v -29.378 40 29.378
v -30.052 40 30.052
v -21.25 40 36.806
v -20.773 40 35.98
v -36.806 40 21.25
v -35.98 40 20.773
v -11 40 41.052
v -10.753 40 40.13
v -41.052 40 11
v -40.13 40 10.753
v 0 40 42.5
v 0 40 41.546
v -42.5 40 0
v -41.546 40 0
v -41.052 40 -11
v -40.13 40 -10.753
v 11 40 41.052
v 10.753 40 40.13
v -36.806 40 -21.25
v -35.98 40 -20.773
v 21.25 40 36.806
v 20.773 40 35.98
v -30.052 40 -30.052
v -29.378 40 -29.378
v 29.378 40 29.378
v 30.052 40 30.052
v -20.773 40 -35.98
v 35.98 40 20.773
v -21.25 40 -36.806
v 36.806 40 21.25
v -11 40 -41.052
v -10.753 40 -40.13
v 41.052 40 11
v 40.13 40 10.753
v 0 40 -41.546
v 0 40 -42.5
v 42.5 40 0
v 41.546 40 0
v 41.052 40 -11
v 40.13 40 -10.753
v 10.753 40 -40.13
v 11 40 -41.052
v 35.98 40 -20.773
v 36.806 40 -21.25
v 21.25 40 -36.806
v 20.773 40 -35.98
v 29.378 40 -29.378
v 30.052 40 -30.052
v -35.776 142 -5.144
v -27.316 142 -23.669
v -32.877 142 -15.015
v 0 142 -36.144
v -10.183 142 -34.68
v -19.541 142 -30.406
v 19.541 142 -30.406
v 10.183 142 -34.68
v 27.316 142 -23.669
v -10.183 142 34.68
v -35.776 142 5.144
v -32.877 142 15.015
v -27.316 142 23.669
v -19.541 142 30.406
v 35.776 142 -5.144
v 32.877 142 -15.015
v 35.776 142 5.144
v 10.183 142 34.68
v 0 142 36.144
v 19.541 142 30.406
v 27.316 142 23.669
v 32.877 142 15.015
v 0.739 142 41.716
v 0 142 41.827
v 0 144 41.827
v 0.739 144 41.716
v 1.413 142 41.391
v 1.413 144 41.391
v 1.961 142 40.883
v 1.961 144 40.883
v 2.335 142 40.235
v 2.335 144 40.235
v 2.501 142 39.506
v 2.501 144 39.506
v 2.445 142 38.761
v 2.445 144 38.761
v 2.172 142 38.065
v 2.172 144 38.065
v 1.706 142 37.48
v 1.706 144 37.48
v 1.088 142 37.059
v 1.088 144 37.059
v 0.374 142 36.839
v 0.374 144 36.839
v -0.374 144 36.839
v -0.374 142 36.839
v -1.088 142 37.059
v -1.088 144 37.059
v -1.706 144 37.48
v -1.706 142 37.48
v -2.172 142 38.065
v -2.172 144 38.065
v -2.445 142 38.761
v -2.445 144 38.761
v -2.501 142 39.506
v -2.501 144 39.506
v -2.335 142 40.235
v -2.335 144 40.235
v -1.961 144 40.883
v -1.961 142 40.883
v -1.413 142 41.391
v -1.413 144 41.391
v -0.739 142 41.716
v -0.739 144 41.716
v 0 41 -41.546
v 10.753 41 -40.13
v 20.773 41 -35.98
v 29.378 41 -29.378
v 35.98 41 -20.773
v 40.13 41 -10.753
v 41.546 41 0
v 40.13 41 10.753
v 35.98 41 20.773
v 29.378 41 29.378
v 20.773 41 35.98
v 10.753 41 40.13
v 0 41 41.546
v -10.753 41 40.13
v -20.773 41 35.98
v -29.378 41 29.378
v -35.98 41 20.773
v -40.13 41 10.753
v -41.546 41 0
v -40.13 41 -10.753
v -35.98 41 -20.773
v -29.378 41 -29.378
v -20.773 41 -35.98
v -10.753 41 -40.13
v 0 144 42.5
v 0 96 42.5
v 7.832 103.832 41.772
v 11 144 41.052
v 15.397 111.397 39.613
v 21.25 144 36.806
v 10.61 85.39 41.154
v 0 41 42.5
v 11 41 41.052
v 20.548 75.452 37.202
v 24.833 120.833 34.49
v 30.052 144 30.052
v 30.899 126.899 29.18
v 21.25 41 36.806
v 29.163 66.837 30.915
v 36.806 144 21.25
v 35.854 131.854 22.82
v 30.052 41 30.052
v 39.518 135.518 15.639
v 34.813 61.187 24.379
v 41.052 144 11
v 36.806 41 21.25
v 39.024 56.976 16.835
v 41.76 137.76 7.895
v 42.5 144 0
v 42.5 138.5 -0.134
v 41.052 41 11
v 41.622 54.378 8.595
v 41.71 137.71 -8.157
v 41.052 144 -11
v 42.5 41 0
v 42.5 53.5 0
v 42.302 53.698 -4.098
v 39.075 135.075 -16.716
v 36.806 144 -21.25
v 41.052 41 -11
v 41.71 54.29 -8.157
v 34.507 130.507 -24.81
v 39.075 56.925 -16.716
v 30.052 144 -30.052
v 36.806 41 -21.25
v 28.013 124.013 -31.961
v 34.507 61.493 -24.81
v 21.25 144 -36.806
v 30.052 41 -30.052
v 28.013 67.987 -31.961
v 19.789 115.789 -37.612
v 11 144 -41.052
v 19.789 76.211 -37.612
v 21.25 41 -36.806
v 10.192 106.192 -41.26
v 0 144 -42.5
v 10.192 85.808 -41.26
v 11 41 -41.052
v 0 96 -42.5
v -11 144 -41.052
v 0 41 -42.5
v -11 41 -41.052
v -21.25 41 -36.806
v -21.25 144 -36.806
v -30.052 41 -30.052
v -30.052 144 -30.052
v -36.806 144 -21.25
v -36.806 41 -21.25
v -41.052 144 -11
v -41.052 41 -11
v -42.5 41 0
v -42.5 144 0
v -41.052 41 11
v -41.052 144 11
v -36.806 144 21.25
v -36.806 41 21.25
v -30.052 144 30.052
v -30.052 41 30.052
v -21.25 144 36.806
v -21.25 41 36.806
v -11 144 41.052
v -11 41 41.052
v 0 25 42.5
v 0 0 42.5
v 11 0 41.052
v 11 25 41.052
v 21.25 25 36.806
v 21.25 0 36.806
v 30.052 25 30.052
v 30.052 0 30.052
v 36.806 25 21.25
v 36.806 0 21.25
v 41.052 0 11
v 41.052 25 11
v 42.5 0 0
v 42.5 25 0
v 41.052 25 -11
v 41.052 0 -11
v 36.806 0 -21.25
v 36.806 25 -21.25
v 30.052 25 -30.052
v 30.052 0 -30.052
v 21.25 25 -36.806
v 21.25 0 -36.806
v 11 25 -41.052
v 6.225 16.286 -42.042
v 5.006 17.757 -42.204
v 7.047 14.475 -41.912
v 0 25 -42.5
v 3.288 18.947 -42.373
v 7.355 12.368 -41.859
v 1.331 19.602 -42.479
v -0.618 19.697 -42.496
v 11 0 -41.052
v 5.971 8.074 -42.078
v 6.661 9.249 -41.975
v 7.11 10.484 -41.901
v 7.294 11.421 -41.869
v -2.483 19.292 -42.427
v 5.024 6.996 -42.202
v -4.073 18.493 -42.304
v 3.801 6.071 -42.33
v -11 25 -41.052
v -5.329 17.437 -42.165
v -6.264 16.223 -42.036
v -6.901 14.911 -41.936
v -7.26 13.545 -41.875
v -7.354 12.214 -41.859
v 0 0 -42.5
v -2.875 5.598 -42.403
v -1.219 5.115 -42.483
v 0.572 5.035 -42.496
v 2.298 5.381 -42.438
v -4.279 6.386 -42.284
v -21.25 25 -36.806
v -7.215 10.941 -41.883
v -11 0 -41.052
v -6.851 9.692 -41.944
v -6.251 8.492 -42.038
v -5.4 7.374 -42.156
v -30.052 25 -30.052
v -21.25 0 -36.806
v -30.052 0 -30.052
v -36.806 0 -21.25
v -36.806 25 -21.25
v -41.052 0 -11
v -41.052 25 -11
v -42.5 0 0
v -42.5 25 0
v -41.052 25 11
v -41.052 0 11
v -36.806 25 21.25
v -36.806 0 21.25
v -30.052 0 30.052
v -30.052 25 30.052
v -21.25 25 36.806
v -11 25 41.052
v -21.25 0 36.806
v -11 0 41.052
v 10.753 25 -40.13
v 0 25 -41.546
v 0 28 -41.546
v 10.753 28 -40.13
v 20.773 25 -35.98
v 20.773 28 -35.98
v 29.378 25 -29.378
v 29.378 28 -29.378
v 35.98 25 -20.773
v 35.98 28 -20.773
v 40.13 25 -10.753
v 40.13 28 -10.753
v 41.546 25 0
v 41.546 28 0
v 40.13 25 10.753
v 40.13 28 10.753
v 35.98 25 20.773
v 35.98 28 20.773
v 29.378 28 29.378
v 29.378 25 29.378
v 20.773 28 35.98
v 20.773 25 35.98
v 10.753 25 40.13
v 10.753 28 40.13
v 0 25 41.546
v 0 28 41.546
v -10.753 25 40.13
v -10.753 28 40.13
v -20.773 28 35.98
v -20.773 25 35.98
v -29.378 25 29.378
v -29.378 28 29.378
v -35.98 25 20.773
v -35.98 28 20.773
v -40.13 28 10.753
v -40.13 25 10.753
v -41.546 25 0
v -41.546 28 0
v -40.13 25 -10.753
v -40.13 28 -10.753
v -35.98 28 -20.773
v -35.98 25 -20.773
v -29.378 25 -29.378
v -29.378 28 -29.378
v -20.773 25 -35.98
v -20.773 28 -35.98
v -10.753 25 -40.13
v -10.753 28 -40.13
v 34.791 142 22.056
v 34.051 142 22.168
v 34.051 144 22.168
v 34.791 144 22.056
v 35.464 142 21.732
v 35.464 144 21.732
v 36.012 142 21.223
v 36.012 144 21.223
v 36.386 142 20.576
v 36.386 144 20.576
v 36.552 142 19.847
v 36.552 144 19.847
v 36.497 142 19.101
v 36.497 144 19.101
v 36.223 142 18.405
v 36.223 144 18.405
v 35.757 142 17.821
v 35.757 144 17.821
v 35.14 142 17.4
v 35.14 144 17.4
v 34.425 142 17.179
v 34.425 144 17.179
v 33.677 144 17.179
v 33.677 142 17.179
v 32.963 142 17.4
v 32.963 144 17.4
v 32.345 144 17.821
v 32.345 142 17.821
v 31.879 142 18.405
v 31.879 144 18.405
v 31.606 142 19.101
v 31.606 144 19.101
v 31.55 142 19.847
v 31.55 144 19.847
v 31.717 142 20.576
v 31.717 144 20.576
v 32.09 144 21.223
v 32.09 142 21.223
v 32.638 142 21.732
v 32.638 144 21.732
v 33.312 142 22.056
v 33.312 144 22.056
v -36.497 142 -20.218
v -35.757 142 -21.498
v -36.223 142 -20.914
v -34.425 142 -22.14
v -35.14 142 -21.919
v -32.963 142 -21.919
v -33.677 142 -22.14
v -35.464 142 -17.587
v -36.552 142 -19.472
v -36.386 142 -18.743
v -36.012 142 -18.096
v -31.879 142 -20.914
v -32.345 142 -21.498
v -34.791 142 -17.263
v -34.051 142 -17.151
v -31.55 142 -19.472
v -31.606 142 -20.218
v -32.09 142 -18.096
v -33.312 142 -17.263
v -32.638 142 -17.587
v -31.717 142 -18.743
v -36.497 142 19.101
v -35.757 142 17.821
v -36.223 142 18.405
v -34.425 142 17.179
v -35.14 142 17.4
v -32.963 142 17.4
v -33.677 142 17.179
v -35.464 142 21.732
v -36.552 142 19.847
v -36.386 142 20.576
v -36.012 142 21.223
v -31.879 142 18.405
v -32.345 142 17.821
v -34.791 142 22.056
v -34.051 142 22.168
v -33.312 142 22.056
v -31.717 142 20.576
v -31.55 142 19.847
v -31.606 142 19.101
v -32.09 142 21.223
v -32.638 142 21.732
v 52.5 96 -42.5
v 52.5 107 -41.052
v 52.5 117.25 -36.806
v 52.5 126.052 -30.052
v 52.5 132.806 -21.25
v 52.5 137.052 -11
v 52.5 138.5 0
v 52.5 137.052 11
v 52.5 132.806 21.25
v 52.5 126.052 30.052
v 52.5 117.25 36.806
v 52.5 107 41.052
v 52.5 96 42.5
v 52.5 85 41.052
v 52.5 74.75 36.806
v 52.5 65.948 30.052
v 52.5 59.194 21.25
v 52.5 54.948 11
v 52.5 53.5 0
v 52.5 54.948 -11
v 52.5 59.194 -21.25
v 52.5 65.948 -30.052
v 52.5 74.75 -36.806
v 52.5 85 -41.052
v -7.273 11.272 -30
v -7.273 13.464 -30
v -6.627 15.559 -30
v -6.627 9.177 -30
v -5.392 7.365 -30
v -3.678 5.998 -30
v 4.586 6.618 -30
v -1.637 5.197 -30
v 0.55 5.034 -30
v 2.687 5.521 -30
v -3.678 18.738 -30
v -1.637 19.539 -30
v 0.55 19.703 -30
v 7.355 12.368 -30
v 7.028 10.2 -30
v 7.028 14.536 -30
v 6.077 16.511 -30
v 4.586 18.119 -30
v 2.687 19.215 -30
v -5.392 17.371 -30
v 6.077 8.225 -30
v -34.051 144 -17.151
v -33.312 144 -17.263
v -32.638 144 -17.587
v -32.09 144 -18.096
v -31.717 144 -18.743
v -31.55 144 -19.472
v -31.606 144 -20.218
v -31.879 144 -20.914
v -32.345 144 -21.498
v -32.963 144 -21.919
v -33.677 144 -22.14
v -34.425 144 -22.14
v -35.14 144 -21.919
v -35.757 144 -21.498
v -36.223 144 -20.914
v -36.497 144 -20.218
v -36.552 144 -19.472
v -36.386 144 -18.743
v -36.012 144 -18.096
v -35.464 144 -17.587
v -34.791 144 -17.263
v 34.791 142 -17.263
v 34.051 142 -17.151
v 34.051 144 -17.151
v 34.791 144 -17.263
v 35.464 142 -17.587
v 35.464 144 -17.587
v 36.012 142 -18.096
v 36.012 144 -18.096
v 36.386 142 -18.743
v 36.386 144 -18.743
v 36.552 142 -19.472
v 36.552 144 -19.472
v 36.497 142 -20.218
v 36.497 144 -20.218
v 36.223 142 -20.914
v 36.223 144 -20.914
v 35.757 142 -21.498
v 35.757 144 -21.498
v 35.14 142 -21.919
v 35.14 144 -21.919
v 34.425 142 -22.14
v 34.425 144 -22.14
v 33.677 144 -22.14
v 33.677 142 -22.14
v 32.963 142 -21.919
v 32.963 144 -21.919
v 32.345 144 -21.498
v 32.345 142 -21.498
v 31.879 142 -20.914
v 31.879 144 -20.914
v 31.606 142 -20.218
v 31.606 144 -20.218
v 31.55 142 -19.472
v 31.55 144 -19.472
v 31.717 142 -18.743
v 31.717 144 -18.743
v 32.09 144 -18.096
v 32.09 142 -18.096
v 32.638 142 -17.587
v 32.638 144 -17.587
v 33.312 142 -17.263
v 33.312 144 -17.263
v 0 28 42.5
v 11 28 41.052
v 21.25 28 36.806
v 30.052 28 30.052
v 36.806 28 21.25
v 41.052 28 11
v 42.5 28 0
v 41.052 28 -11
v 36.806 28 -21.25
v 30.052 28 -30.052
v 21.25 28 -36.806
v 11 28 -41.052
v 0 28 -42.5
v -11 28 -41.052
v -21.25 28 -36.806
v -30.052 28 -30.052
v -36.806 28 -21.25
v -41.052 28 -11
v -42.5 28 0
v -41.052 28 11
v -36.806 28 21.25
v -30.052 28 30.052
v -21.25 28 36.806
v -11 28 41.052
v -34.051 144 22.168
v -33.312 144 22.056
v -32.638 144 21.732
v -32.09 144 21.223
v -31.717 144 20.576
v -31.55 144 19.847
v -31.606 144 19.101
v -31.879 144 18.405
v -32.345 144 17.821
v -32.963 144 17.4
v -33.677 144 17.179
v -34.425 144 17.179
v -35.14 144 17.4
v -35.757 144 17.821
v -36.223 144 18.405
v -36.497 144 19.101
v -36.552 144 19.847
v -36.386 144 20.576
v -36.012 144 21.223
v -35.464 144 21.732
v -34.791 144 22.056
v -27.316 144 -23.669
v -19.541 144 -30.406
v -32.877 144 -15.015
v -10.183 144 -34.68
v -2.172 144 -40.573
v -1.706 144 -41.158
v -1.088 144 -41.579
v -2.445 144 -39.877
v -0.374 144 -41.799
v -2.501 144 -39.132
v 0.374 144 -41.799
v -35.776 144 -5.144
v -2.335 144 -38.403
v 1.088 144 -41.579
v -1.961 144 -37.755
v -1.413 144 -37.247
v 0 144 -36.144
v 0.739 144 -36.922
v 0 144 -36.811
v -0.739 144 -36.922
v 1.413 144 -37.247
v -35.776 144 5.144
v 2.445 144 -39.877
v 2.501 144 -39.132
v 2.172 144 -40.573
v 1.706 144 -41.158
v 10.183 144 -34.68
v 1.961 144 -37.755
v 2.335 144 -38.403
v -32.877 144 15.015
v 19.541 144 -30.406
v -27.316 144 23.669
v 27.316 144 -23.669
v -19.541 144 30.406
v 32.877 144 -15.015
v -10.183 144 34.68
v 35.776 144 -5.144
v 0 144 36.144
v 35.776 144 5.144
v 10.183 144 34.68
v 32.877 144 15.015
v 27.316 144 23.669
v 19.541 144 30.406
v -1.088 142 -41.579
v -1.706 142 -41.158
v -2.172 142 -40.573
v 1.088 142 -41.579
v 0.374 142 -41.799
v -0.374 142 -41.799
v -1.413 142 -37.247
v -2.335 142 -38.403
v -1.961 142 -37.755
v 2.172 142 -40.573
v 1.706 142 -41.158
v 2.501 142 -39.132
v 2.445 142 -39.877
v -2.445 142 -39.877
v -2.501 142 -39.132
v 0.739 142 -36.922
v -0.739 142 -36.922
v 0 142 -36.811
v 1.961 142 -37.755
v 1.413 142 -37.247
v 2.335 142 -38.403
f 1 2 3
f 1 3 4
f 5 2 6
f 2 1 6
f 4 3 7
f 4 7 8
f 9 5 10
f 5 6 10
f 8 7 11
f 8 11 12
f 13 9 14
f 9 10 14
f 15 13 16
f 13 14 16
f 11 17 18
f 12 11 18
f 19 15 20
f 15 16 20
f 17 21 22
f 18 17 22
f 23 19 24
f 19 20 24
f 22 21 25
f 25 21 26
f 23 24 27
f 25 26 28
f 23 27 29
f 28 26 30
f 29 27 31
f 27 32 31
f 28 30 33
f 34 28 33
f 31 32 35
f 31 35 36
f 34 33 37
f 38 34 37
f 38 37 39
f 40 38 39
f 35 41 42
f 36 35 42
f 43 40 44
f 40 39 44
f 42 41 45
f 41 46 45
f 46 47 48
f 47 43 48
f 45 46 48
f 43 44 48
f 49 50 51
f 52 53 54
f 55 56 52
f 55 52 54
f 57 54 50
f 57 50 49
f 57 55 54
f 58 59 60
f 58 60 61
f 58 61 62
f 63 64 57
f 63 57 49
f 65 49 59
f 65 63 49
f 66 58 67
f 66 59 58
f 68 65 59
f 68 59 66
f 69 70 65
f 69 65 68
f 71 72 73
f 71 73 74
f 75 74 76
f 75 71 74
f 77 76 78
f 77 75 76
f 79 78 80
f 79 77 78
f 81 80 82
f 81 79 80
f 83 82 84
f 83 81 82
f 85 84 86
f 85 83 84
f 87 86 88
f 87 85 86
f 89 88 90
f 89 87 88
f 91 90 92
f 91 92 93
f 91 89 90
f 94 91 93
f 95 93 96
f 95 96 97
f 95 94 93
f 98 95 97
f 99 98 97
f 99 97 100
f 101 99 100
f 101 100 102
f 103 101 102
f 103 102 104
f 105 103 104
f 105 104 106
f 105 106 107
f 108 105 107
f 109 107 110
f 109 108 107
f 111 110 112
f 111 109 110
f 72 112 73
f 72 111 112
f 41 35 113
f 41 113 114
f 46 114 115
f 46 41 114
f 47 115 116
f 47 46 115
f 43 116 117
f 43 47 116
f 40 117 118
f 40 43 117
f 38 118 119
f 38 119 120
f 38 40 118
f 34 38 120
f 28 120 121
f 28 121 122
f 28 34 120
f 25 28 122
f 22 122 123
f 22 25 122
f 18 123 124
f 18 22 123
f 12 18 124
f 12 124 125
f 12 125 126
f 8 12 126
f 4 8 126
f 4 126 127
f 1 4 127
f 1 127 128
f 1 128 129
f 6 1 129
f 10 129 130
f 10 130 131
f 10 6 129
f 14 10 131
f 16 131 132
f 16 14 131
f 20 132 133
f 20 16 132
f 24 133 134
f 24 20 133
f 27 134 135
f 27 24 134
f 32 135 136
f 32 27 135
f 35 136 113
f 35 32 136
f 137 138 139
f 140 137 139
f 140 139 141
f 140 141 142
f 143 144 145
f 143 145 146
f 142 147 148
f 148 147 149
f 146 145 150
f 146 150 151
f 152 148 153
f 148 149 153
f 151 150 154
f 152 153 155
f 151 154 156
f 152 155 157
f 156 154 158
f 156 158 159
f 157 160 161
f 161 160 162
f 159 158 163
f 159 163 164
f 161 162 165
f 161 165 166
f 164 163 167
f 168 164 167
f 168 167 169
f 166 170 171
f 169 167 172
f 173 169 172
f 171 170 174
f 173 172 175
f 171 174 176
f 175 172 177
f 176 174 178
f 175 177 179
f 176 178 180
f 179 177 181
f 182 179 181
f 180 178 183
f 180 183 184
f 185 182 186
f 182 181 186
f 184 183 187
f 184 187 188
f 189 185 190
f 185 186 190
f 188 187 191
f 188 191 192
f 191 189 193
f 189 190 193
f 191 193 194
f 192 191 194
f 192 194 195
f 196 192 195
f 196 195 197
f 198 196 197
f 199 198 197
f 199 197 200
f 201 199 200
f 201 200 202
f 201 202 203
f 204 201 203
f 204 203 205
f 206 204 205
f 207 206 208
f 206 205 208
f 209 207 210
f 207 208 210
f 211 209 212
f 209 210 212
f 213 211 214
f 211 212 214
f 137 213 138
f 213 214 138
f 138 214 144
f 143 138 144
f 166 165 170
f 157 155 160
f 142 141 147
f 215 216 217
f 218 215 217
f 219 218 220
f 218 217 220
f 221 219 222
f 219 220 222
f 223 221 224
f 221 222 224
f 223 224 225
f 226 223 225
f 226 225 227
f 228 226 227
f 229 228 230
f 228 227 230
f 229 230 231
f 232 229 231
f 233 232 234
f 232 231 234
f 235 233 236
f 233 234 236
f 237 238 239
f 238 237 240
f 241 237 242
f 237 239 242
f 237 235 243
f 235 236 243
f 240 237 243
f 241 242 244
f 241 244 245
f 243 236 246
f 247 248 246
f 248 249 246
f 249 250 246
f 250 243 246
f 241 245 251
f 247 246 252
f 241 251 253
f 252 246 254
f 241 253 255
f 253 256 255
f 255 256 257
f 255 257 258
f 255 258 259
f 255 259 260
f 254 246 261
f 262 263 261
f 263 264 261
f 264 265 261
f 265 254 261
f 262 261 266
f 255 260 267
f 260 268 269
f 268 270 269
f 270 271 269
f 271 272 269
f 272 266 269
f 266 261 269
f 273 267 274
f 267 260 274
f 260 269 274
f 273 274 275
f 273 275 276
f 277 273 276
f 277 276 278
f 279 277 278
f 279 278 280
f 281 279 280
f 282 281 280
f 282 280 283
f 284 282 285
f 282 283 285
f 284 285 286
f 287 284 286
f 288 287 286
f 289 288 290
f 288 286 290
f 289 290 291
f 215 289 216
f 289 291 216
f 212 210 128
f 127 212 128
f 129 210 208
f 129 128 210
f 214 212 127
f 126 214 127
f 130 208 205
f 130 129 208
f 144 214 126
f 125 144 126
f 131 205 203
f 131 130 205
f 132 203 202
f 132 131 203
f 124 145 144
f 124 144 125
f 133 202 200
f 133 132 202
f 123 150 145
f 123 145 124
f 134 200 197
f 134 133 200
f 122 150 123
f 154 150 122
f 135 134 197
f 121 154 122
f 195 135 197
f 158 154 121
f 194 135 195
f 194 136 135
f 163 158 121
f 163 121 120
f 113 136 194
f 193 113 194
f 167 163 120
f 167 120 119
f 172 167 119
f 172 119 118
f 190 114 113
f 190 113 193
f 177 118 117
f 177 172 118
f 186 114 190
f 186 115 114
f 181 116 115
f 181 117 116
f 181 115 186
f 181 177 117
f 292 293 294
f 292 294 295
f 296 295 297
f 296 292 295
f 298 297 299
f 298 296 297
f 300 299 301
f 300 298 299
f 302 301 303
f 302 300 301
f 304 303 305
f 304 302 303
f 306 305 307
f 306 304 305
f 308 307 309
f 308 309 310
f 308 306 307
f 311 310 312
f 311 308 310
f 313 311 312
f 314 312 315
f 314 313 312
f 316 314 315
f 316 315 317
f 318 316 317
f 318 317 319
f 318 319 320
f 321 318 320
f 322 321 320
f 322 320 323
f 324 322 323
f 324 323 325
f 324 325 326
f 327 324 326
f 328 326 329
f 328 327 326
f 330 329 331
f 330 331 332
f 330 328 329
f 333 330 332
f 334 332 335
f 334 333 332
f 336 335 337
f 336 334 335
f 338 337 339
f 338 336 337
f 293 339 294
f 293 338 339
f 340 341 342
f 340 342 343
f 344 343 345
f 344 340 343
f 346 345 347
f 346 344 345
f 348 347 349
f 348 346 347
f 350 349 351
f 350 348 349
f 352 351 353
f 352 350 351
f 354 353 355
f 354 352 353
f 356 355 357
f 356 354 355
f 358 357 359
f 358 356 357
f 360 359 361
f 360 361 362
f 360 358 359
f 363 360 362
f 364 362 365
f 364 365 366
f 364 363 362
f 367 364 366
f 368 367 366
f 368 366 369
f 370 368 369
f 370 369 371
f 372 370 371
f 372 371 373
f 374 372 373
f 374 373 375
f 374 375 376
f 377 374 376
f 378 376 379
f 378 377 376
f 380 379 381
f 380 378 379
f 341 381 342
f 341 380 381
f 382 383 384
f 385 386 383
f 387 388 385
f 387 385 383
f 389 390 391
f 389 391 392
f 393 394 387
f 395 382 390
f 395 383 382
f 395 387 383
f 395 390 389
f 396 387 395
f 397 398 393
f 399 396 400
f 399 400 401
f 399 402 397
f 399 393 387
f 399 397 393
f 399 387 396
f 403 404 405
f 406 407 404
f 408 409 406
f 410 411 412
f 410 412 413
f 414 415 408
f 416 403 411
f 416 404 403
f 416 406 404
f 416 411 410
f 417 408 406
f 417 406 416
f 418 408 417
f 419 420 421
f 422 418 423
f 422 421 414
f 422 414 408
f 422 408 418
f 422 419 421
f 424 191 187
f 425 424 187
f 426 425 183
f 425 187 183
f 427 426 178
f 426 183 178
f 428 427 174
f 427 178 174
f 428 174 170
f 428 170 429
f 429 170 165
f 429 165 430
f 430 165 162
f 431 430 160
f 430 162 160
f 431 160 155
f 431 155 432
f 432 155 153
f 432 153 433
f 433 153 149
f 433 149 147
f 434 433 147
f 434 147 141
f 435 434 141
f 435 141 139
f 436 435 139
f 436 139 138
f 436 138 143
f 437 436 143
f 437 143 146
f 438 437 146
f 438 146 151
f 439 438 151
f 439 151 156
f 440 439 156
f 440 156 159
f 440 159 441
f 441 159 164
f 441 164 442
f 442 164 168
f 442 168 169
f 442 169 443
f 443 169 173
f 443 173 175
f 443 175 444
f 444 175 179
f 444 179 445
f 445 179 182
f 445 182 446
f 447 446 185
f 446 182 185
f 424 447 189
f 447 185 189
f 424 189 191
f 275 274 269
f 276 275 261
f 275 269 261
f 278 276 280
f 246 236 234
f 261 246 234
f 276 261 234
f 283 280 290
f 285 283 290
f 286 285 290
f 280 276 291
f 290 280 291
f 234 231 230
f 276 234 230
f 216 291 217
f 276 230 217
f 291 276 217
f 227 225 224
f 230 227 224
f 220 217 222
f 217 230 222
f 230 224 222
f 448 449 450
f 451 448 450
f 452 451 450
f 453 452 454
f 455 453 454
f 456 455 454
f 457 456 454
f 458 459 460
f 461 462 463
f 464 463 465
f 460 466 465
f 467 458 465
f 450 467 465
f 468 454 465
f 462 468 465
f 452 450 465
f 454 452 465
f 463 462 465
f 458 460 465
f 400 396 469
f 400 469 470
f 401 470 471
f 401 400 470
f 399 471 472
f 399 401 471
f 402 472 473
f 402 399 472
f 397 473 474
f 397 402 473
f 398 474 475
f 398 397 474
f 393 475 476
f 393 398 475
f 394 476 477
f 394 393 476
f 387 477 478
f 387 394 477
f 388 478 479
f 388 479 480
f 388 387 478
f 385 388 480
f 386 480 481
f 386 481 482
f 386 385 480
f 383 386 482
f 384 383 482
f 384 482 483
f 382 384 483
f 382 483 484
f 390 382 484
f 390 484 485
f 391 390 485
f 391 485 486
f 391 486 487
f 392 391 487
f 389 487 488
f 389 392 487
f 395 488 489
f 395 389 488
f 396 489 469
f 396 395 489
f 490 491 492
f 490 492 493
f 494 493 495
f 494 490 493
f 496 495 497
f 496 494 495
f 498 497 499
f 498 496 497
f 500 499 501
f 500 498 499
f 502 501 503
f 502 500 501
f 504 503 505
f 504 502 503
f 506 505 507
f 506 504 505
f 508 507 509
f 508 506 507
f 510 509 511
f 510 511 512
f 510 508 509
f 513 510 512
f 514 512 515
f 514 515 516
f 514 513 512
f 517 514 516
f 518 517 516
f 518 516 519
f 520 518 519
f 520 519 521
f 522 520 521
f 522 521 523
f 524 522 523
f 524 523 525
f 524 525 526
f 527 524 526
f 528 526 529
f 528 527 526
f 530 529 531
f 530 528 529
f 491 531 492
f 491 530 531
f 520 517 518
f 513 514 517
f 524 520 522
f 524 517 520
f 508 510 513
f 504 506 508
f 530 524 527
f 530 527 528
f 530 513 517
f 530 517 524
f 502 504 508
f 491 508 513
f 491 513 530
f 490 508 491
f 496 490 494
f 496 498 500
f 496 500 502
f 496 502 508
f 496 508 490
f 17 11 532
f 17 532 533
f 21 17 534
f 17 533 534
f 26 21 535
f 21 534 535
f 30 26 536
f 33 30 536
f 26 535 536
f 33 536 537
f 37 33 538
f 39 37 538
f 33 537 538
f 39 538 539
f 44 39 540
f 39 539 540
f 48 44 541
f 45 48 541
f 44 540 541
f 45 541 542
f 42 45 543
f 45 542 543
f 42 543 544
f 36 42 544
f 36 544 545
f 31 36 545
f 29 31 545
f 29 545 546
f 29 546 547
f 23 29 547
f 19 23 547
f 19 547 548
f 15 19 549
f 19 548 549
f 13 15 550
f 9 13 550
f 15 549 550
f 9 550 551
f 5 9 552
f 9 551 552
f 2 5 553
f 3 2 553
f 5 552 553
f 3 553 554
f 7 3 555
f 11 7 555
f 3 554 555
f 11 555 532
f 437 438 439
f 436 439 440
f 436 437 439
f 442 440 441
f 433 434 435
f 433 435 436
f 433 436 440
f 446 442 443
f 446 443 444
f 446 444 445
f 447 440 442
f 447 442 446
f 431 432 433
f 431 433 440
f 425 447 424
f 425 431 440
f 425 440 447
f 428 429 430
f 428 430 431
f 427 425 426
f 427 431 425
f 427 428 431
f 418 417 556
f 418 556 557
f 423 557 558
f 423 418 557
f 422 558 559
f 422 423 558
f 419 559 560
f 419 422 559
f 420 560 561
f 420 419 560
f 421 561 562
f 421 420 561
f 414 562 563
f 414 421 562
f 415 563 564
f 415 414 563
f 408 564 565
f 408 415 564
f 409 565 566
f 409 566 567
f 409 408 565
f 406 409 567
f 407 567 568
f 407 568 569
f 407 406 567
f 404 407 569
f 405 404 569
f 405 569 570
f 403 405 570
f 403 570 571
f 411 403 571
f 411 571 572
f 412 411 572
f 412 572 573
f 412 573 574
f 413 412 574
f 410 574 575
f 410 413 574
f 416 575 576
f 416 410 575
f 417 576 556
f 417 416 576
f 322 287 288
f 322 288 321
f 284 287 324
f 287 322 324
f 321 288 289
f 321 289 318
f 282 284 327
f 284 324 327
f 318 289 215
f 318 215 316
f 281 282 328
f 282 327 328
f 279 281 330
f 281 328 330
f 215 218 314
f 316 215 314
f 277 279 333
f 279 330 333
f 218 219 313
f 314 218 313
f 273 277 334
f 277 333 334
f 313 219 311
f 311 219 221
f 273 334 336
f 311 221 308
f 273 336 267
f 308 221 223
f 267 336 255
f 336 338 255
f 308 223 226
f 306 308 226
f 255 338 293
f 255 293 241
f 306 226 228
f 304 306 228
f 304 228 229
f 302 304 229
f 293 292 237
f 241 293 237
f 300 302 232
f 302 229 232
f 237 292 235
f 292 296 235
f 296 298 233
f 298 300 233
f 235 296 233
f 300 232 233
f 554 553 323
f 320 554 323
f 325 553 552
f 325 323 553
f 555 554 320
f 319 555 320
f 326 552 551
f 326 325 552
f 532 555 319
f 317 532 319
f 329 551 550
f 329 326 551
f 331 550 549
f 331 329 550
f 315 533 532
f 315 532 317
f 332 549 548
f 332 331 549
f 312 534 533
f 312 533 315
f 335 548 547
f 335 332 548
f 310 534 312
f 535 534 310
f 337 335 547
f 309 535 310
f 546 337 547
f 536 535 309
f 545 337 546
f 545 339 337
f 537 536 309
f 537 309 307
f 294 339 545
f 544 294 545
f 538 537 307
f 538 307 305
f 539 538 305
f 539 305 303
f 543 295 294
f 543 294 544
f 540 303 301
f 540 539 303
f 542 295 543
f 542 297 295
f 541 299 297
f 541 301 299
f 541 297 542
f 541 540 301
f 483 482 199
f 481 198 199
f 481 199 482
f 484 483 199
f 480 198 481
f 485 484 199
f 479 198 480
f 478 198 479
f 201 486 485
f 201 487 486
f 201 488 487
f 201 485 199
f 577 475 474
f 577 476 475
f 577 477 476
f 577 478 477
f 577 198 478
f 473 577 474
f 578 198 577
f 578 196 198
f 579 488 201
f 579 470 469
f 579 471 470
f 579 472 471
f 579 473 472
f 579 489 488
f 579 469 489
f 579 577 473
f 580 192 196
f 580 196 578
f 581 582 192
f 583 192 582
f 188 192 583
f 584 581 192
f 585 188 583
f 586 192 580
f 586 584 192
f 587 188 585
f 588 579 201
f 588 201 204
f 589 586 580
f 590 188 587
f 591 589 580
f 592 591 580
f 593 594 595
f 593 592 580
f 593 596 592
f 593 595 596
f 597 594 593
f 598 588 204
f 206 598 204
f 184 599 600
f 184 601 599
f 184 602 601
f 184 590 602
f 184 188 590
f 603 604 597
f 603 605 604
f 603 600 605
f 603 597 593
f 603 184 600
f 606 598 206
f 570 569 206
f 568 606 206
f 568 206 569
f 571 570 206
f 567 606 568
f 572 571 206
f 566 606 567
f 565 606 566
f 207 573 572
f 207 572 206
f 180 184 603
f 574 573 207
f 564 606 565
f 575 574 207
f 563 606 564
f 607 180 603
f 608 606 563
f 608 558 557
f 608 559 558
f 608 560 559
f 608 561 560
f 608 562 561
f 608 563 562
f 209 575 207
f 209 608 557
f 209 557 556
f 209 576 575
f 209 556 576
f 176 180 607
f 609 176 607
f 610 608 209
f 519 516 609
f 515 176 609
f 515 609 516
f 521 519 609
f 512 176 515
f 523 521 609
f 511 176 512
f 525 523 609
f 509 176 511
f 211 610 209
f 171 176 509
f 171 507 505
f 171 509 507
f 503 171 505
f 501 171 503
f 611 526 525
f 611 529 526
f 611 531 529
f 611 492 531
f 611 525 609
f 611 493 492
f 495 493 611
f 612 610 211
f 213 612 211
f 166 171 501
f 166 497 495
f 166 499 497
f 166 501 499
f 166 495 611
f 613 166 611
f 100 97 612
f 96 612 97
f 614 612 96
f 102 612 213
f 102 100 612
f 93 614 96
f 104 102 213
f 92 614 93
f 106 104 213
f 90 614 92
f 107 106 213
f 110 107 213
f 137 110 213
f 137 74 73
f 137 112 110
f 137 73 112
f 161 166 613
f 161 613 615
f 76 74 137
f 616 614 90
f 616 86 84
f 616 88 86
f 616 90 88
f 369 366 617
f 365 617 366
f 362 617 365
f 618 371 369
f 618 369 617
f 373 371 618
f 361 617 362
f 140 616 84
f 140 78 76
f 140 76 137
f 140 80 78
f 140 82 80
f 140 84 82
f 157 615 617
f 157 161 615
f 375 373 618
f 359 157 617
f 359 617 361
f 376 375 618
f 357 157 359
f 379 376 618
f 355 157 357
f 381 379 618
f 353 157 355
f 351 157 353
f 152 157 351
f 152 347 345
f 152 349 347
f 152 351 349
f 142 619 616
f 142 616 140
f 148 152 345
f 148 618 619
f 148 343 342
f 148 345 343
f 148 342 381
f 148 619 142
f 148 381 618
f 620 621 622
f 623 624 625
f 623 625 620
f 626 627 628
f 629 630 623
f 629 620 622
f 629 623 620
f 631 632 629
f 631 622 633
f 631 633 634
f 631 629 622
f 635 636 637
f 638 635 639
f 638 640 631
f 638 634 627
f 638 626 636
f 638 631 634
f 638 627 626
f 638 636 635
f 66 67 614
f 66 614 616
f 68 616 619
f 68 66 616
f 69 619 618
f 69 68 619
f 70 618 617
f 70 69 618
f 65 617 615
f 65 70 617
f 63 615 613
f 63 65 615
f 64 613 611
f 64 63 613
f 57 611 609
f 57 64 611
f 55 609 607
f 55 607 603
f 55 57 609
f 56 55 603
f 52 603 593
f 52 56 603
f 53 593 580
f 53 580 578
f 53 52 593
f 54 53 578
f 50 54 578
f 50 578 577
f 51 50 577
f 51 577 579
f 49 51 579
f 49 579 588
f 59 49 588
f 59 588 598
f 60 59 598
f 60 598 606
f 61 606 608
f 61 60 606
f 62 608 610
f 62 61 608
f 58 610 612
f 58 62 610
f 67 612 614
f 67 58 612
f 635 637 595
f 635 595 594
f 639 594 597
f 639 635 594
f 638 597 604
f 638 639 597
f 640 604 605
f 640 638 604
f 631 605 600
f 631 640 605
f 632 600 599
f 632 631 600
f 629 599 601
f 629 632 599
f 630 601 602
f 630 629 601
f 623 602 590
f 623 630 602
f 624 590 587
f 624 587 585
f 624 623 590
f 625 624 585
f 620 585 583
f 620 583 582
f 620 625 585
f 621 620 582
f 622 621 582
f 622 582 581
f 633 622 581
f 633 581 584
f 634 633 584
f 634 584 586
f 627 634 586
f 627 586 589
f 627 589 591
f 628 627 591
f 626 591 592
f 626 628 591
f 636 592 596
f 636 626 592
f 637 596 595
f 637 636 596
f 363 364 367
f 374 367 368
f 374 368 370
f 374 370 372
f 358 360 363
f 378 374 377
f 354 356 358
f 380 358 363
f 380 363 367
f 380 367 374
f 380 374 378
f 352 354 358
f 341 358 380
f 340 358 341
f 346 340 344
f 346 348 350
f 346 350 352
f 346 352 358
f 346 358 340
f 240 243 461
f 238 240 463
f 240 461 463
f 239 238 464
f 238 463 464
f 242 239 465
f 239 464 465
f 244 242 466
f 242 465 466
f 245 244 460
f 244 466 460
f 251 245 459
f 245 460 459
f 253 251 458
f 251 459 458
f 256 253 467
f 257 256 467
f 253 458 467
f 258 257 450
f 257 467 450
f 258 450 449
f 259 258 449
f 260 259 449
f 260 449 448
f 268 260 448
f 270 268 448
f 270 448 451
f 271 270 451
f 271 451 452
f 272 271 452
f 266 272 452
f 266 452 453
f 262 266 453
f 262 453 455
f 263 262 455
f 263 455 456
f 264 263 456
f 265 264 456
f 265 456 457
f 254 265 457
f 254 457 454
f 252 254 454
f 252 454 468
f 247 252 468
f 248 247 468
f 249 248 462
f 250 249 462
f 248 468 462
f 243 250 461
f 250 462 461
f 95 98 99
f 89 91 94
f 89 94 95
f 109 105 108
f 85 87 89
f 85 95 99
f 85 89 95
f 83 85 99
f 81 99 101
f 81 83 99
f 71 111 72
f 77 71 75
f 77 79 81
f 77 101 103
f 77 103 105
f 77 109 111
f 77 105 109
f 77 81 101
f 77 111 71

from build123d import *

# Parameters (mm, degrees)
CROQUIS1_R              = 42.5
SALIENTE_EXTRUIR1_DEPTH = 142
CROQUIS2_R              = 42.5
SALIENTE_EXTRUIR2_DEPTH = 52.5
CROQUIS3_R              = 42.5
CROQUIS3_R_2            = 36.143595246
CROQUIS3_R_3            = 2.508178933
SALIENTE_EXTRUIR3_DEPTH = 2
CORTAR_EXTRUIR1_START   = -25
CROQUIS6_R              = 42.5
CROQUIS6_R_2            = 41.546105734
CORTAR_EXTRUIR1_DEPTH   = 3
CORTAR_EXTRUIR2_START   = -40
CROQUIS7_R              = 42.5
CROQUIS7_R_2            = 41.546105734
CORTAR_EXTRUIR2_DEPTH   = 1
CORTAR_EXTRUIR3_START   = -30
CROQUIS8_R              = 7.355169738
CORTAR_EXTRUIR3_DEPTH   = 21


with BuildPart() as part:
    # Croquis1 → Saliente-Extruir1 (new body)
    with BuildSketch(Plane(origin=(0, 0, 0), x_dir=(1, 0, 0), z_dir=(0, 1, 0))):
        with Locations(Location((0, 0, 0), (0, 0, 270))):
            Circle(CROQUIS1_R)
    extrude(amount=SALIENTE_EXTRUIR1_DEPTH)

    # Croquis2 → Saliente-Extruir2 (add)
    with BuildSketch(Plane(origin=(0, 0, 0), x_dir=(0, 0, -1), z_dir=(1, 0, 0))):
        with Locations((0, 96)):
            Circle(CROQUIS2_R)
    extrude(amount=SALIENTE_EXTRUIR2_DEPTH)

    # Croquis3 → Saliente-Extruir3 (add)
    with BuildSketch(Plane(origin=(0, 142, 0), x_dir=(1, 0, 0), z_dir=(0, 1, 0))):
        with Locations(Location((0, 0, 0), (0, 0, 270))):
            Circle(CROQUIS3_R)
        with Locations(Location((0, 0, 0), (0, 0, 270))):
            Circle(CROQUIS3_R_2, mode=Mode.SUBTRACT)
        with Locations(Location((0, 39.319059372, 0), (0, 0, 270))):
            Circle(CROQUIS3_R_3, mode=Mode.SUBTRACT)
        with Locations(Location((34.051304269, 19.659529686, 0), (0, 0, 270))):
            Circle(CROQUIS3_R_3, mode=Mode.SUBTRACT)
        with Locations(Location((34.051304269, -19.659529686, 0), (0, 0, 270))):
            Circle(CROQUIS3_R_3, mode=Mode.SUBTRACT)
        with Locations(Location((0, -39.319059372, 0), (0, 0, 270))):
            Circle(CROQUIS3_R_3, mode=Mode.SUBTRACT)
        with Locations(Location((-34.051304269, -19.659529686, 0), (0, 0, 270))):
            Circle(CROQUIS3_R_3, mode=Mode.SUBTRACT)
        with Locations(Location((-34.051304269, 19.659529686, 0), (0, 0, 270))):
            Circle(CROQUIS3_R_3, mode=Mode.SUBTRACT)
    extrude(amount=SALIENTE_EXTRUIR3_DEPTH)

    # Croquis6 → Cortar-Extruir1 (cut)
    with BuildSketch(Plane.XZ.offset(CORTAR_EXTRUIR1_START)):
        with Locations(Location((0, 0, 0), (0, 0, 270))):
            Circle(CROQUIS6_R)
        with Locations(Location((0, 0, 0), (0, 0, 270))):
            Circle(CROQUIS6_R_2, mode=Mode.SUBTRACT)
    extrude(amount=-CORTAR_EXTRUIR1_DEPTH, mode=Mode.SUBTRACT)

    # Croquis7 → Cortar-Extruir2 (cut)
    with BuildSketch(Plane(origin=(0, 0, 0), x_dir=(-1, 0, 0), z_dir=(0, -1, 0)).offset(CORTAR_EXTRUIR2_START)):
        with Locations(Location((0, 0, 0), (0, 0, 90))):
            Circle(CROQUIS7_R)
        with Locations(Location((0, 0, 0), (0, 0, 90))):
            Circle(CROQUIS7_R_2, mode=Mode.SUBTRACT)
    extrude(amount=-CORTAR_EXTRUIR2_DEPTH, mode=Mode.SUBTRACT)

    # Croquis8 → Cortar-Extruir3 (cut)
    with BuildSketch(Plane.XY.offset(CORTAR_EXTRUIR3_START)):
        with Locations((0, 12.368172151)):
            Circle(CROQUIS8_R)
    extrude(amount=-CORTAR_EXTRUIR3_DEPTH, mode=Mode.SUBTRACT)


solid = part.part
